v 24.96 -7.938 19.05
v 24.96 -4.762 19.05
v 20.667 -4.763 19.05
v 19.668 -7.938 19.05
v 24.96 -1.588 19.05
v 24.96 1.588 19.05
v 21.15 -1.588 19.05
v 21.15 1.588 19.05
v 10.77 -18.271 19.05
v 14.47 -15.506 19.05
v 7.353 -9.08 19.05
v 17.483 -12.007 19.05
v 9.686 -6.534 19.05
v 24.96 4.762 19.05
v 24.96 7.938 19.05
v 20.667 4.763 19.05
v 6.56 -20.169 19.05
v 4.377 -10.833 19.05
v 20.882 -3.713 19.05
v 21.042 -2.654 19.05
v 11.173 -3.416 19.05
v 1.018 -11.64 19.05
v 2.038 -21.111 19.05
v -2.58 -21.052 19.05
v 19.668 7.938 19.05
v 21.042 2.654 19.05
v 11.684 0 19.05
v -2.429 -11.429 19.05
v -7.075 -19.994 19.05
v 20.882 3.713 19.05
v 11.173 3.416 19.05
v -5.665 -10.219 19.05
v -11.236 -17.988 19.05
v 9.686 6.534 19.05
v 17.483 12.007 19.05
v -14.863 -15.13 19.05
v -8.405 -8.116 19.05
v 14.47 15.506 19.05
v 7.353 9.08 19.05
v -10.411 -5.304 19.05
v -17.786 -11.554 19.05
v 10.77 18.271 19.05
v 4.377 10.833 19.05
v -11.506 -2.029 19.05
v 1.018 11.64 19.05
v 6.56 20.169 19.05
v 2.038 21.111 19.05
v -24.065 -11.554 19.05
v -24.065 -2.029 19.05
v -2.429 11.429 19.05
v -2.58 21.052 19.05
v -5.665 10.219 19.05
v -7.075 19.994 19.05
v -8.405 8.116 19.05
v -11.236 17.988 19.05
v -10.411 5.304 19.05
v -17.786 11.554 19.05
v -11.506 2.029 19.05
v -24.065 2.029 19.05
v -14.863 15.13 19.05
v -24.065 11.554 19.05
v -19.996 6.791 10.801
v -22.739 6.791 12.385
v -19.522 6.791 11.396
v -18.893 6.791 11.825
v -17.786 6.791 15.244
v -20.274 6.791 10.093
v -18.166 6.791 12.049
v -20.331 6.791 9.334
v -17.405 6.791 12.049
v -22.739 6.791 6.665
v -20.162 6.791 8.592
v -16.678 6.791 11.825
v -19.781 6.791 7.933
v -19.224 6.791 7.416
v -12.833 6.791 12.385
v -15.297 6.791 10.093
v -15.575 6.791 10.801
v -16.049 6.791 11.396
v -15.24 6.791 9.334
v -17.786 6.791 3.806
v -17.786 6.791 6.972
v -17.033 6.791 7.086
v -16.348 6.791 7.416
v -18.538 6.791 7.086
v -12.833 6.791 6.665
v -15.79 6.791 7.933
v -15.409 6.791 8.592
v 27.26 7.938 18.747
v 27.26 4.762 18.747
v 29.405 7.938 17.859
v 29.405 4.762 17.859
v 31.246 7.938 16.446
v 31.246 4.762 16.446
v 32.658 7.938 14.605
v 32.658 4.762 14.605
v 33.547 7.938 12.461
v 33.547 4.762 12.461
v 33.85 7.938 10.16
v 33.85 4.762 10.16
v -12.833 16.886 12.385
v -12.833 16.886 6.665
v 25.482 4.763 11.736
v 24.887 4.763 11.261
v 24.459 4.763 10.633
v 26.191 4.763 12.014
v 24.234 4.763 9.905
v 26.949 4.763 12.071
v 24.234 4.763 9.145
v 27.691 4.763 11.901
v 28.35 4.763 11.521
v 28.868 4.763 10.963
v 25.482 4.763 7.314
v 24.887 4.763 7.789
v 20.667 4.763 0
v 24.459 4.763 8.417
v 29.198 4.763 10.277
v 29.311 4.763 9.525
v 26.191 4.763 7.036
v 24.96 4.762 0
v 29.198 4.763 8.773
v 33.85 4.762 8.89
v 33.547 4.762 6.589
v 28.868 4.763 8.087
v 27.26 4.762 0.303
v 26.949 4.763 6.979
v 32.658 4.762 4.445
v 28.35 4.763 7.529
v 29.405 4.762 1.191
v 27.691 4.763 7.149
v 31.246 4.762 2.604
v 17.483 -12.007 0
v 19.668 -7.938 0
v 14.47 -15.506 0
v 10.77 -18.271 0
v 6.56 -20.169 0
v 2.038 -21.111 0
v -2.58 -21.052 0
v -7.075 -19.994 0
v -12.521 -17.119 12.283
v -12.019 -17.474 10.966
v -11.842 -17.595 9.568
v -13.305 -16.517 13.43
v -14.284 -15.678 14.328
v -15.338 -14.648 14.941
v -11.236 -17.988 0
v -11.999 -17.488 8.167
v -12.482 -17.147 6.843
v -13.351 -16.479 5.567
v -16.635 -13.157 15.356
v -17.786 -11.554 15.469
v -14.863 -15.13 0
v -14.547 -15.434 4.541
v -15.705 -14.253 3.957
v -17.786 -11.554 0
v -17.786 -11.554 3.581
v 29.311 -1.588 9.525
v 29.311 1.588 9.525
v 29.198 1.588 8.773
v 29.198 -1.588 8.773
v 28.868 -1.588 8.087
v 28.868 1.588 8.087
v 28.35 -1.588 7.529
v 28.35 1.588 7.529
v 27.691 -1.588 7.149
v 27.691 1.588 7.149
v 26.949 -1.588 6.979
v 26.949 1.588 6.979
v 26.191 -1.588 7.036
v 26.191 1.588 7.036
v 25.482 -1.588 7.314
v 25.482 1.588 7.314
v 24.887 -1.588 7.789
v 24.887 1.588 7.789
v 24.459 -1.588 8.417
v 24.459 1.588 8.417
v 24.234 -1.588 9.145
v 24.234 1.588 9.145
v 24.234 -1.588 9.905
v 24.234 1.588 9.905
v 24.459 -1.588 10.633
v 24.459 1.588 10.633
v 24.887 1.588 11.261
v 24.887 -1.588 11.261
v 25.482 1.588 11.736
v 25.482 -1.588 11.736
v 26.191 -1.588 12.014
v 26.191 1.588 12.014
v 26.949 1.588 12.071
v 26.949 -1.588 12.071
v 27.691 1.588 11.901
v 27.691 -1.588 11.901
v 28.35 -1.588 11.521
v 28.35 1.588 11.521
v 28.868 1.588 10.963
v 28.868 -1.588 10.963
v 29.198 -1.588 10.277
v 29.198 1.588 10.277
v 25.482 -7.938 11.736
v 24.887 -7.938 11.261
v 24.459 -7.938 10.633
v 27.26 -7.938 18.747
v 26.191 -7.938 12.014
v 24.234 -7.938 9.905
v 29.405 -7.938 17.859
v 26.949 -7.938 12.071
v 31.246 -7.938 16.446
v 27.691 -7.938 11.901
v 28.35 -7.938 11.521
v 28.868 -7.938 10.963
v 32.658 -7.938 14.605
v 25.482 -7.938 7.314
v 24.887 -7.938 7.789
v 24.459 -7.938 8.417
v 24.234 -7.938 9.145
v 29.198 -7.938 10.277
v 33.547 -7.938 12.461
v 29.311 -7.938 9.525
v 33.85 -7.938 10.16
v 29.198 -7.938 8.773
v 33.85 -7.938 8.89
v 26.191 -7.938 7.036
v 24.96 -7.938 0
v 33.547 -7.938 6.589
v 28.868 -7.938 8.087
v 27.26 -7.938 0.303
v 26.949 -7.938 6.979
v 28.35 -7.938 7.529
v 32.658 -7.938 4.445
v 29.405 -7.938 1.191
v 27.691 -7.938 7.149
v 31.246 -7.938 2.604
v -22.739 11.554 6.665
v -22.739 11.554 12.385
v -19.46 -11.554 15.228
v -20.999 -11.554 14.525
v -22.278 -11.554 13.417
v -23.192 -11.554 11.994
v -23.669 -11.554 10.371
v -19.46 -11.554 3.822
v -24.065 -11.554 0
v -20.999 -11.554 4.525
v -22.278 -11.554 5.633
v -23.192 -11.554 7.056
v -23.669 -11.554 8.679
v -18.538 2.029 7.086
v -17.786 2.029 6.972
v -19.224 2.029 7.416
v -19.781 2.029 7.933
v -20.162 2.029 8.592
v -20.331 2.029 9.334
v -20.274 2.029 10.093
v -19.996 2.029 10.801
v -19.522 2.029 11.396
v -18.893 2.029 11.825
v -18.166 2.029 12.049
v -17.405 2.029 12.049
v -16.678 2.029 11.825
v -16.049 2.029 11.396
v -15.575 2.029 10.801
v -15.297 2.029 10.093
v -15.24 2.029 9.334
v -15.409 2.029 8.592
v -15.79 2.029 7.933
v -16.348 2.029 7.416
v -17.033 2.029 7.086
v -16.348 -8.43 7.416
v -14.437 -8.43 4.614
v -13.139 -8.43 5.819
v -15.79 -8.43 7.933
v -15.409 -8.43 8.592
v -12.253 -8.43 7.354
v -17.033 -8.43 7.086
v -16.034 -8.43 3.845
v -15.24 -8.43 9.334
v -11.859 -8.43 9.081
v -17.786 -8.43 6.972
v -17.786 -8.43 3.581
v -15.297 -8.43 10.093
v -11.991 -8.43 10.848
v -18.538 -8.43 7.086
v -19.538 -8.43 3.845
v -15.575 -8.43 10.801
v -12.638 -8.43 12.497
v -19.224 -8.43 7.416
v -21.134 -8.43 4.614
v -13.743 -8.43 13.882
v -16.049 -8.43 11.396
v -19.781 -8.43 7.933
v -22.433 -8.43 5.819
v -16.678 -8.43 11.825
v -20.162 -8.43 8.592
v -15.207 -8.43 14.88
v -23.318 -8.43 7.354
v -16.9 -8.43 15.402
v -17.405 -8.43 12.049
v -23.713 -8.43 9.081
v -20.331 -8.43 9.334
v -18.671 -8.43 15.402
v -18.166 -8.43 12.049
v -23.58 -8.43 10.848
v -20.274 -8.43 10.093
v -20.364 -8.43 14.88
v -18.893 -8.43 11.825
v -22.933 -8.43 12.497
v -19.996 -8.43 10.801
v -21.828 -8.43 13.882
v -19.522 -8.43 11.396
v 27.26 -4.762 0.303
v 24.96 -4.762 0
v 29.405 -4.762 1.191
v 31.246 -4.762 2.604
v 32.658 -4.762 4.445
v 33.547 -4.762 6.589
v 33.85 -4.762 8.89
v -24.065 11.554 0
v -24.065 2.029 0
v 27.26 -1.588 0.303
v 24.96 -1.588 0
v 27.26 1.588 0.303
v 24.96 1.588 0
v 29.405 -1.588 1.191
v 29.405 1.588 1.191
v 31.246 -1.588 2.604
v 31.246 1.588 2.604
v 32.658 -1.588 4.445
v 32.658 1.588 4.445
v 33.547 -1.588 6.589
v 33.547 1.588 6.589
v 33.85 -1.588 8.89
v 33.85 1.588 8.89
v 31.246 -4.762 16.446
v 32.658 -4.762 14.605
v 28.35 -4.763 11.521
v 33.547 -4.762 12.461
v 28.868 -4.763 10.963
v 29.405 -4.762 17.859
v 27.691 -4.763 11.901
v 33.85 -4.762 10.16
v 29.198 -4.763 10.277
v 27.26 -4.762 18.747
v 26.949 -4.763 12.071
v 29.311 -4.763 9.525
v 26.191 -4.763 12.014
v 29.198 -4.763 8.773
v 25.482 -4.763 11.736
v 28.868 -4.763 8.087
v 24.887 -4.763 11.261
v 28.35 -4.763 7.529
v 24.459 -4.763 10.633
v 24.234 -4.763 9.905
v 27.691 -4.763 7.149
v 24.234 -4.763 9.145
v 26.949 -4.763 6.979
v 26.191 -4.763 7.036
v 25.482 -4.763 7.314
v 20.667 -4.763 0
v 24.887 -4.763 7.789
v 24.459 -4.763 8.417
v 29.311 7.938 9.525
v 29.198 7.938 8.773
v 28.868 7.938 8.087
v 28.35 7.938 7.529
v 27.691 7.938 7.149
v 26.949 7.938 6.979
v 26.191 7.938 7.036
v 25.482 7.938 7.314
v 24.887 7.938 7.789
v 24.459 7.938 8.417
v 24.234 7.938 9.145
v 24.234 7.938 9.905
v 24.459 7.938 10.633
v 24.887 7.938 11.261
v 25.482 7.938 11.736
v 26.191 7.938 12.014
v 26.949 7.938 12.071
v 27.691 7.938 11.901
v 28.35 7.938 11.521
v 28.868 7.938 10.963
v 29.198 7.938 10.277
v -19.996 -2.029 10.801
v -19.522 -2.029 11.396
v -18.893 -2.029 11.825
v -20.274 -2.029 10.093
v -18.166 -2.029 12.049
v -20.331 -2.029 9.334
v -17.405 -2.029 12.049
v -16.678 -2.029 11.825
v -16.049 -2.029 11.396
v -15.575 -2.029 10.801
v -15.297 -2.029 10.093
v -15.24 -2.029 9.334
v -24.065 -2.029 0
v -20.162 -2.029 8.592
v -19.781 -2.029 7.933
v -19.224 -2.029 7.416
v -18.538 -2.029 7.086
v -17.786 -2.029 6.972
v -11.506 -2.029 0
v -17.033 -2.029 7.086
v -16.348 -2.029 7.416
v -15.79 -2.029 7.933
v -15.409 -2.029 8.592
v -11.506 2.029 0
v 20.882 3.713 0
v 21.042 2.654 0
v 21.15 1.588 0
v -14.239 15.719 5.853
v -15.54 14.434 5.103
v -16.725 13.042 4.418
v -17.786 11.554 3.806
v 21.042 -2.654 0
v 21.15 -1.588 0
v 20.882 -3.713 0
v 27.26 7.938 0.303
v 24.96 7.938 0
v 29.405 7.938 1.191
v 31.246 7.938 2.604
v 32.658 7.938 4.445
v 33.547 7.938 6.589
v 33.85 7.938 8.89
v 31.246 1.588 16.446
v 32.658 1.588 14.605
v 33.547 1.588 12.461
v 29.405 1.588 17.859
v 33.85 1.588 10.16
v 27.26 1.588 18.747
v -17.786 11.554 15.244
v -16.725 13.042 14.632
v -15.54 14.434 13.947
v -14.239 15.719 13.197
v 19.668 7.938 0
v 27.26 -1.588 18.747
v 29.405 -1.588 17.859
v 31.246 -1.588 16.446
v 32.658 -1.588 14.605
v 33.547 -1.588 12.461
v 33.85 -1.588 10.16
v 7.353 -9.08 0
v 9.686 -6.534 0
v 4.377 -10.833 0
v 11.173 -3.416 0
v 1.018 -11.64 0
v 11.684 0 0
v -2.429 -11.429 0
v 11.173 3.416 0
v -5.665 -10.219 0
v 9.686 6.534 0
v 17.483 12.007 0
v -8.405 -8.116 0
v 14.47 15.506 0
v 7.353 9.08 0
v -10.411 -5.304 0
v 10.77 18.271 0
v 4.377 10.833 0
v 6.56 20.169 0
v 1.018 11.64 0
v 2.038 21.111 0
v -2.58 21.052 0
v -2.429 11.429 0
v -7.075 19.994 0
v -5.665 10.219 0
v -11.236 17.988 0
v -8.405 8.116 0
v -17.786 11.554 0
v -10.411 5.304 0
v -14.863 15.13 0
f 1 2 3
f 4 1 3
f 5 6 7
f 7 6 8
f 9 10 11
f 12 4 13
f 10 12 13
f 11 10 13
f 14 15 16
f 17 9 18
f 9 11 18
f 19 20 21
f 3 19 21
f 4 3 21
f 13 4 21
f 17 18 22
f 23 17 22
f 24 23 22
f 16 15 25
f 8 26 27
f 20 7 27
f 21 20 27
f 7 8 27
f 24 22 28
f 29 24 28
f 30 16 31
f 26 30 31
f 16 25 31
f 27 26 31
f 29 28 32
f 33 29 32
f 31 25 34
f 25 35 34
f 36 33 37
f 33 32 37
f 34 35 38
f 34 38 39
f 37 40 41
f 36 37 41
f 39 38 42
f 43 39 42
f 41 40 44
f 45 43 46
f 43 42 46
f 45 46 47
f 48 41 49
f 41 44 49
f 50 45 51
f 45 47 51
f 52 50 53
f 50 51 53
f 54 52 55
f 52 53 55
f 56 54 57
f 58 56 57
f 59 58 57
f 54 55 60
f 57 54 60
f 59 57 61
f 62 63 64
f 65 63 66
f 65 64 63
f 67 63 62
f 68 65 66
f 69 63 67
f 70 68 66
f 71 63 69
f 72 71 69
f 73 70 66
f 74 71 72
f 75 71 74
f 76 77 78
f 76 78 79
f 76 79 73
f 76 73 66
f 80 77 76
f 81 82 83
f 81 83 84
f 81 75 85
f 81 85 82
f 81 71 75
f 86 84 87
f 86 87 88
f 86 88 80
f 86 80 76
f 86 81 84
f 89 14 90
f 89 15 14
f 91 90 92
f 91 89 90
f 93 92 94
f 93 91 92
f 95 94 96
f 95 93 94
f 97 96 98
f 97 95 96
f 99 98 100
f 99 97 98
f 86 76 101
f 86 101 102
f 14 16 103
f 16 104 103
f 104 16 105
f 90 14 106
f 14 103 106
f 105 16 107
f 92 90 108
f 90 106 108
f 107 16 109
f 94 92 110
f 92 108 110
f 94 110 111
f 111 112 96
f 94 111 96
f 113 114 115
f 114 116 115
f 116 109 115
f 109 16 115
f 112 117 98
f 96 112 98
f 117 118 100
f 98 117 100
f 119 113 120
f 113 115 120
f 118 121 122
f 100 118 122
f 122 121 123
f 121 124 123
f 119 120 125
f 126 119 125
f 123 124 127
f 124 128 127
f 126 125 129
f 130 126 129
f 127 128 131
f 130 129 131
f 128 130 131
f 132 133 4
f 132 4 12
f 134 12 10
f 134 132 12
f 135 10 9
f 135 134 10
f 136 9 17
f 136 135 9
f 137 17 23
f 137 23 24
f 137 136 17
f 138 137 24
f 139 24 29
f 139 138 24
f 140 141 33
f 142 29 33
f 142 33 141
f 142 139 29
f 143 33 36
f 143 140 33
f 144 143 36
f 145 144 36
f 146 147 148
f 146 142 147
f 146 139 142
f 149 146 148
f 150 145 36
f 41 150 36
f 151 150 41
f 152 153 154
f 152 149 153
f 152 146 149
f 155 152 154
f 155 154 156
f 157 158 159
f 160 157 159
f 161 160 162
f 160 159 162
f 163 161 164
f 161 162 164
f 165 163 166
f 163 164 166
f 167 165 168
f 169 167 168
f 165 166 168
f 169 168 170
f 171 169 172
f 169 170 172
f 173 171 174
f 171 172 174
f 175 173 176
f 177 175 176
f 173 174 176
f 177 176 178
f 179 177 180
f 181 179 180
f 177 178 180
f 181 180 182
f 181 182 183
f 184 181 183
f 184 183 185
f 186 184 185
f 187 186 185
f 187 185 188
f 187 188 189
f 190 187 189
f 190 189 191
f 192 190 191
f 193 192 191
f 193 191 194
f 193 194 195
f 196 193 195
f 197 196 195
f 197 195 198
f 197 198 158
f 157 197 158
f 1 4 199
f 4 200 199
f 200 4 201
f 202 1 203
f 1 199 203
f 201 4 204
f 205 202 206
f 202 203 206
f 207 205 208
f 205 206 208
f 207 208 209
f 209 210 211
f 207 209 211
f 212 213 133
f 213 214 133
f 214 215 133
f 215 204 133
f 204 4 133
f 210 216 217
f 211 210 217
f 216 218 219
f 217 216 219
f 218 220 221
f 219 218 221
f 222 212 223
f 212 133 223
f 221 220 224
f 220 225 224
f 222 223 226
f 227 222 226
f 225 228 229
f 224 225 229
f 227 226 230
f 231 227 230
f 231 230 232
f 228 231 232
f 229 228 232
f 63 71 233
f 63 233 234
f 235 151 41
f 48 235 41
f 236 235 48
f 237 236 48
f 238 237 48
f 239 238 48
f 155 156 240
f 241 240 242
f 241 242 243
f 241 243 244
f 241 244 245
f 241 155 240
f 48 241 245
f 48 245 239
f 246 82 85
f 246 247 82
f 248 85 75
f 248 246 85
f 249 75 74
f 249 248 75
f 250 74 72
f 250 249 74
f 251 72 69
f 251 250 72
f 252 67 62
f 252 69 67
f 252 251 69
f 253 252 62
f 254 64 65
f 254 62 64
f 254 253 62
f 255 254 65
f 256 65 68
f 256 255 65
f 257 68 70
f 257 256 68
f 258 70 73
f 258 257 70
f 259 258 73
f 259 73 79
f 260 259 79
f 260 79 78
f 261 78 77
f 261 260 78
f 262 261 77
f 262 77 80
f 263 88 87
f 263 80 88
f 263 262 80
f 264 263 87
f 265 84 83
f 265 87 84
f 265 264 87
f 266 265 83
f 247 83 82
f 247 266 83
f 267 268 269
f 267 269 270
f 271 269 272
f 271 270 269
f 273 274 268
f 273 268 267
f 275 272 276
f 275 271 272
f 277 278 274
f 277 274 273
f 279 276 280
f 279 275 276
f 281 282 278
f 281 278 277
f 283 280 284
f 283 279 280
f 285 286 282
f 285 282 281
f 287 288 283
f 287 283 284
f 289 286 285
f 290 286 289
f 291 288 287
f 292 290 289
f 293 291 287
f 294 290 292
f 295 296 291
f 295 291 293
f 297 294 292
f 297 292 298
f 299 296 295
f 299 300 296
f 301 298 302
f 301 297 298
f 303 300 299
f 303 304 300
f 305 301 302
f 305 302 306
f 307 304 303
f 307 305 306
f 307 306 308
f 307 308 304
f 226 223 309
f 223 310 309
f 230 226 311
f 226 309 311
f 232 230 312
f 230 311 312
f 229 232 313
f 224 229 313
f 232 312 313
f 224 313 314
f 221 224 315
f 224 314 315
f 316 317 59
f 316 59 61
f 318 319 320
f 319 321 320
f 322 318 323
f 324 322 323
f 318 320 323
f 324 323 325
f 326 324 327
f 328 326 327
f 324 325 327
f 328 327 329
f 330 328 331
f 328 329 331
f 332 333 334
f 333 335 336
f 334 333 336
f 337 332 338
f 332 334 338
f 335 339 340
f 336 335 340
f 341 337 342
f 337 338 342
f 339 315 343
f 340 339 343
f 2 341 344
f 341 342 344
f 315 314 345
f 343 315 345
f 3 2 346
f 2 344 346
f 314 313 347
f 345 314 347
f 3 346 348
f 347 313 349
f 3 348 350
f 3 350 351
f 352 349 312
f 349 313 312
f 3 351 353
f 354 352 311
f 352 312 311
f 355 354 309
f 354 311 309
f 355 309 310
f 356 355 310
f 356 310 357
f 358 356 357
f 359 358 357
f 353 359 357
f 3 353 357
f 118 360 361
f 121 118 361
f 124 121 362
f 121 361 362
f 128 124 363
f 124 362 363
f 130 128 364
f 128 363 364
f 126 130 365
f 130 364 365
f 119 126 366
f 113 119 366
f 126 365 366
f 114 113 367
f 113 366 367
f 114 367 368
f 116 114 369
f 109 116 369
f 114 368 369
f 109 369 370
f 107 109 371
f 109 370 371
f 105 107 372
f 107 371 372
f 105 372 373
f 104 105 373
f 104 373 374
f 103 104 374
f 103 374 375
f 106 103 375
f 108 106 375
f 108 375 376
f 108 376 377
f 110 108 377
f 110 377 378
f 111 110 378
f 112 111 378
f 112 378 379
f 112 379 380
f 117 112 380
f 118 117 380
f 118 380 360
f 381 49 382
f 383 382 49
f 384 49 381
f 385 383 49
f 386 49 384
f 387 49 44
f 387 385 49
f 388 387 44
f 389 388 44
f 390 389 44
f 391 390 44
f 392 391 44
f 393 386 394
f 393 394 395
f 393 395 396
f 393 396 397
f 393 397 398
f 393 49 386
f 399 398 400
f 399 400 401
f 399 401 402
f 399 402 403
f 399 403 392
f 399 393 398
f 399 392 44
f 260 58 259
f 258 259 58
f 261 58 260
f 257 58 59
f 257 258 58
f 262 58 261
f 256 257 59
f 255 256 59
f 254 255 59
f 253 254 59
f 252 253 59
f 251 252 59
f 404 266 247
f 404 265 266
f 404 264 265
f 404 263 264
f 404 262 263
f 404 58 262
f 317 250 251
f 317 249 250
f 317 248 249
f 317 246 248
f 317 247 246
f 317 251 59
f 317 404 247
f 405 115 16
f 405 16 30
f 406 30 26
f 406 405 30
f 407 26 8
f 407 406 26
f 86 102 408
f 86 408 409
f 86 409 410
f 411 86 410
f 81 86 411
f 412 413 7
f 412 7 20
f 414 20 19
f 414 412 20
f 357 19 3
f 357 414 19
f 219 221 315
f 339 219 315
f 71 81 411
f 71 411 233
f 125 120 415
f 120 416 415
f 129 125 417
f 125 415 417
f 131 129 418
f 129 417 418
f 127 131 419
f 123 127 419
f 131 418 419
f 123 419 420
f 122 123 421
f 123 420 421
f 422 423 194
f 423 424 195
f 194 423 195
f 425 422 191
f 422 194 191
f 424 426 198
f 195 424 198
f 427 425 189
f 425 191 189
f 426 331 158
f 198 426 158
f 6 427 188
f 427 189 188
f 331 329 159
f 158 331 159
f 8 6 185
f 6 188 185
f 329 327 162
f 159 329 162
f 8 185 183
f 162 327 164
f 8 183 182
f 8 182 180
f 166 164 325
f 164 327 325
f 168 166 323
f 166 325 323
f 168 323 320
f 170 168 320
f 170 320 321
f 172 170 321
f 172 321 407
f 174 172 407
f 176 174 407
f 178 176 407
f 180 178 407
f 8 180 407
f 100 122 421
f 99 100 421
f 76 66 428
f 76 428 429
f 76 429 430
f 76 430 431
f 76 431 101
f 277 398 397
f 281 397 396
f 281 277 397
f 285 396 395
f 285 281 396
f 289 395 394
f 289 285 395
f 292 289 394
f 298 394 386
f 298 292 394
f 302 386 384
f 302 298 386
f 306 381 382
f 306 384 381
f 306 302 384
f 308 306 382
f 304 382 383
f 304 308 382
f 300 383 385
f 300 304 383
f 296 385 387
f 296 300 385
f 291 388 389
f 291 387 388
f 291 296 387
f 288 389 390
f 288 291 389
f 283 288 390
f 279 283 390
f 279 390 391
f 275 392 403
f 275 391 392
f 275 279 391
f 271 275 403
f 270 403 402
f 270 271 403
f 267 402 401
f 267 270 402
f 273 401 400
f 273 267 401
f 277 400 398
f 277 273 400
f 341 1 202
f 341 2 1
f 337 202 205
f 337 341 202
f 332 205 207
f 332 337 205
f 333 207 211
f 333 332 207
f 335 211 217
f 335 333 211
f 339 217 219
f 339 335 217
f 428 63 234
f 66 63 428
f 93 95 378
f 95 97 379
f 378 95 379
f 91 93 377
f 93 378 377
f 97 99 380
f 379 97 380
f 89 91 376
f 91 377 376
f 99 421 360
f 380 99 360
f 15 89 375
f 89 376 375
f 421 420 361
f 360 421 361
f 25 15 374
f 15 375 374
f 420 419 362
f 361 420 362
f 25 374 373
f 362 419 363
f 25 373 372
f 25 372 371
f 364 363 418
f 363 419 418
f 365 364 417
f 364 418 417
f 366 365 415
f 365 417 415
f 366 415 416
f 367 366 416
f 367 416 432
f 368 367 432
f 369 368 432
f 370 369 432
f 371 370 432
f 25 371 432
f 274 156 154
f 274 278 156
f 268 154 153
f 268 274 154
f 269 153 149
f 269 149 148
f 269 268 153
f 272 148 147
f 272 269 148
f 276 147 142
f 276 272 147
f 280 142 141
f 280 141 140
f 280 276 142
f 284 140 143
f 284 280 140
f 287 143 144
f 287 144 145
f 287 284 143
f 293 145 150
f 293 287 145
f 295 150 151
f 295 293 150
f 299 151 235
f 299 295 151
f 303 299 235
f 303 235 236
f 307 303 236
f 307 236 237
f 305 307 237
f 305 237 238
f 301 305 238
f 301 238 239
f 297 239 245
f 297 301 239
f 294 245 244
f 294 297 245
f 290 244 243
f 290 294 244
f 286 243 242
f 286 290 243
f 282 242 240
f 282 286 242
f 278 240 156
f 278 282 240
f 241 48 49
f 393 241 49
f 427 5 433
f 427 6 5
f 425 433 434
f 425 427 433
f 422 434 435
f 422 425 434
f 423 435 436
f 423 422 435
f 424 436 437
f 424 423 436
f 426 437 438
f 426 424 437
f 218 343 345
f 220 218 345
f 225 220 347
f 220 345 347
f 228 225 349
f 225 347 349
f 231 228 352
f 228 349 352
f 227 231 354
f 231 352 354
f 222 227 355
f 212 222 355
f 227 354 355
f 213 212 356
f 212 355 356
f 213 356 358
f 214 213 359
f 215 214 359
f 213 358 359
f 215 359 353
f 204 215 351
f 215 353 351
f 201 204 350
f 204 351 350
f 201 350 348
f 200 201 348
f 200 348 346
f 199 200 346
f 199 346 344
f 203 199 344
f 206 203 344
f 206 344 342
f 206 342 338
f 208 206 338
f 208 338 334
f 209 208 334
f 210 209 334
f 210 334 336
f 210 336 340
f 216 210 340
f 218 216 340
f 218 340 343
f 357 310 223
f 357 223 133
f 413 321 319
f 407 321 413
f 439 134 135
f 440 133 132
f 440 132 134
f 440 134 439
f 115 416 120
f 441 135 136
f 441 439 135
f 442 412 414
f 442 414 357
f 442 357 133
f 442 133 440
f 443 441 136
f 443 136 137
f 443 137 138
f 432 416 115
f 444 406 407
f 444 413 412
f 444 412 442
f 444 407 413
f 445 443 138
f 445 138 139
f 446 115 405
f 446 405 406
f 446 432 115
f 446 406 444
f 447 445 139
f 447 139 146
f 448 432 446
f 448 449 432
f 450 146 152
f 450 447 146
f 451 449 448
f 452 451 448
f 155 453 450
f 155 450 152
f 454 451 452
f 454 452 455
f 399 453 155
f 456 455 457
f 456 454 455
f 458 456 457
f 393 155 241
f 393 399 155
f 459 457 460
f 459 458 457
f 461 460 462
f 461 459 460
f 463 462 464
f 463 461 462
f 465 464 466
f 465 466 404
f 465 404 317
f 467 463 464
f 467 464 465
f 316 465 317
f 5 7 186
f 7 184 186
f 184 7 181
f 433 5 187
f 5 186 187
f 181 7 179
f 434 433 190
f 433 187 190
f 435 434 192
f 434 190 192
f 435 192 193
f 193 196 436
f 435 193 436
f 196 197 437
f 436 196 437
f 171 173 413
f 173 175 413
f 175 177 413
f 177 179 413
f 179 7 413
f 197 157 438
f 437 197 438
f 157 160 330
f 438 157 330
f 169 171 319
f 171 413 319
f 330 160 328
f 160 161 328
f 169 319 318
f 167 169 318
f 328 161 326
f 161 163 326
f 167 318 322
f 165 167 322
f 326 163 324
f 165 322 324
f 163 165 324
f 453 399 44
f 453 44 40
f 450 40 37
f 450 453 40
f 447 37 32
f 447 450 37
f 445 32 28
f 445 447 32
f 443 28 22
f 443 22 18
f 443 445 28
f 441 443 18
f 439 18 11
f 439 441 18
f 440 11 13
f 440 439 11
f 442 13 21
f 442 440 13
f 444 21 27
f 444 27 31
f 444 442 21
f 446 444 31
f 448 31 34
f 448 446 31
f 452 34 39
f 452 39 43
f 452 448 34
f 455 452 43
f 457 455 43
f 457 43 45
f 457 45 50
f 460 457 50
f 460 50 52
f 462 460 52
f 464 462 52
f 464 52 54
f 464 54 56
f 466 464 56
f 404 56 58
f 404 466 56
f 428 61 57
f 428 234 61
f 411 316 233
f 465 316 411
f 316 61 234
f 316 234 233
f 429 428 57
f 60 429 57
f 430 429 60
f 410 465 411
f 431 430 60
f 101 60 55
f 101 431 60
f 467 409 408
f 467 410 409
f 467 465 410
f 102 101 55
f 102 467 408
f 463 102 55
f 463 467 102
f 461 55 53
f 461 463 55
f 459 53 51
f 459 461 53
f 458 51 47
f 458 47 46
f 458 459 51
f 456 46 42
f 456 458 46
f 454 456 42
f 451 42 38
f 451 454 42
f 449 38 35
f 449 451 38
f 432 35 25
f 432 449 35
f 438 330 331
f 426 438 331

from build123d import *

# Parameters (mm, degrees)
BODY_DEPTH                    = 19.05
SKETCH4_R                     = 5.9436
F_10_HEAD_CLEARANCE_DEPTH     = 49.85841003
F_10_NUT_CLEARANCE_DEPTH      = 51.814361521
F_10_NUT_CLEARANCE_DEPTH_BACK = 4.7625
FILLET2_R                     = 8.89
F_10_CLEARANCE_HOLE1_D        = 5.1054


with BuildPart() as part:
    # Sketch1 → Body (new body)
    with BuildSketch(Plane.XY):
        with BuildLine():
            ThreePointArc((-11.506493967, -2.02890428), (8.950462938, -7.510330831), (0, 11.684))
            ThreePointArc((0, 11.684), (-7.510330831, 8.950462938), (-11.506493967, 2.02890428))
            Line((-11.506493967, 2.02890428), (-24.064785284, 2.02890428))
            Line((-24.064785284, 2.02890428), (-24.064785284, 11.55390428))
            Line((-24.064785284, 11.55390428), (-17.785639626, 11.55390428))
            ThreePointArc((-17.785639626, 11.55390428), (21.209, 0), (-17.785639626, -11.55390428))
            Line((-17.785639626, -11.55390428), (-24.064785284, -11.55390428))
            Line((-24.064785284, -11.55390428), (-24.064785284, -2.02890428))
            Line((-24.064785284, -2.02890428), (-11.506493967, -2.02890428))
        make_face()
        with BuildLine():
            ThreePointArc((20.667372227, -4.7625), (20.229911928, -6.369642406), (19.667683513, -7.9375))
            Line((19.667683513, -7.9375), (33.849504125, -7.9375))
            Line((33.849504125, -7.9375), (33.849504125, -4.7625))
            Line((33.849504125, -4.7625), (20.667372227, -4.7625))
        make_face()
        with BuildLine():
            Line((33.849504125, 1.5875), (21.149504125, 1.5875))
            ThreePointArc((21.149504125, 1.5875), (21.209, 0), (21.149504125, -1.5875))
            Line((21.149504125, -1.5875), (33.849504125, -1.5875))
            Line((33.849504125, -1.5875), (33.849504125, 1.5875))
        make_face()
        with BuildLine():
            Line((33.849504125, 7.9375), (19.667683513, 7.9375))
            ThreePointArc((19.667683513, 7.9375), (20.229911928, 6.369642406), (20.667372227, 4.7625))
            Line((20.667372227, 4.7625), (33.849504125, 4.7625))
            Line((33.849504125, 4.7625), (33.849504125, 7.9375))
        make_face()
    extrude(amount=BODY_DEPTH)

    # Sketch3 → CBORE for #10 Binding Head Machine Screw1 (revolve, cut)
    with BuildSketch(Plane(origin=(-17.785639626, -11.55390428, 9.525), x_dir=(0, 0, -1), z_dir=(1, 0, 0))):
        Polygon((0, 0), (0, 32.76290428), (2.5527, 32.76290428), (2.5527, 3.1242), (5.9436, 3.1242), (5.9436, 0), align=None)
    revolve(axis=Axis((-17.785639626, -17.90390428, 9.525), (0, 1, 0)), mode=Mode.SUBTRACT)

    # Sketch4 → #10 Head clearance (cut, through all)
    with BuildSketch(Plane.XZ.offset(8.42970428)):
        with Locations(Location((-17.785639626, 9.525, 0), (0, 0, 270))):
            Circle(SKETCH4_R)
    extrude(amount=F_10_HEAD_CLEARANCE_DEPTH, mode=Mode.SUBTRACT)

    # Sketch5 → #10 nut clearance (cut, two sides: drawn at the far end of the back side and taken through both)
    with BuildSketch(Plane(origin=(0, 11.55390428, 0), x_dir=(1, 0, 0), z_dir=(0, 1, 0)).offset(-F_10_NUT_CLEARANCE_DEPTH_BACK)):
        with BuildLine():
            Line((-17.785639626, -3.805768233), (-22.738639626, -6.665384117))
            Line((-22.738639626, -6.665384117), (-22.738639626, -12.384615883))
            Line((-22.738639626, -12.384615883), (-17.785639626, -15.244231767))
            Line((-17.785639626, -15.244231767), (-17.785639626, -12.0777))
            ThreePointArc((-17.785639626, -12.0777), (-20.338339626, -9.525), (-17.785639626, -6.9723))
            Line((-17.785639626, -6.9723), (-17.785639626, -3.805768233))
        make_face()
        with BuildLine():
            Line((-12.832639626, -6.665384117), (-17.785639626, -3.805768233))
            Line((-17.785639626, -3.805768233), (-17.785639626, -6.9723))
            ThreePointArc((-17.785639626, -6.9723), (-20.338339626, -9.525), (-17.785639626, -12.0777))
            Line((-17.785639626, -12.0777), (-17.785639626, -15.244231767))
            Line((-17.785639626, -15.244231767), (-12.832639626, -12.384615883))
            Line((-12.832639626, -12.384615883), (-12.832639626, -6.665384117))
        make_face()
    extrude(amount=F_10_NUT_CLEARANCE_DEPTH + F_10_NUT_CLEARANCE_DEPTH_BACK, mode=Mode.SUBTRACT)

    # Fillet2
    fillet2_edges = [part.edges().sort_by_distance(p)[0] for p in [
        (33.849504125, 6.35, 0),
        (33.849504125, 0, 0),
        (33.849504125, -6.35, 0),
        (33.849504125, -6.35, 19.05),
        (33.849504125, 0, 19.05),
        (33.849504125, 6.35, 19.05),
    ]]
    fillet(fillet2_edges, radius=FILLET2_R)

    # #10 Clearance Hole1 (through all)
    with Locations(Plane(origin=(0, -7.9375, 0), x_dir=(-1, 0, 0), z_dir=(0, -1, 0))):
        with Locations((-26.758593819, -9.525)):
            Hole(F_10_CLEARANCE_HOLE1_D / 2)


solid = part.part
